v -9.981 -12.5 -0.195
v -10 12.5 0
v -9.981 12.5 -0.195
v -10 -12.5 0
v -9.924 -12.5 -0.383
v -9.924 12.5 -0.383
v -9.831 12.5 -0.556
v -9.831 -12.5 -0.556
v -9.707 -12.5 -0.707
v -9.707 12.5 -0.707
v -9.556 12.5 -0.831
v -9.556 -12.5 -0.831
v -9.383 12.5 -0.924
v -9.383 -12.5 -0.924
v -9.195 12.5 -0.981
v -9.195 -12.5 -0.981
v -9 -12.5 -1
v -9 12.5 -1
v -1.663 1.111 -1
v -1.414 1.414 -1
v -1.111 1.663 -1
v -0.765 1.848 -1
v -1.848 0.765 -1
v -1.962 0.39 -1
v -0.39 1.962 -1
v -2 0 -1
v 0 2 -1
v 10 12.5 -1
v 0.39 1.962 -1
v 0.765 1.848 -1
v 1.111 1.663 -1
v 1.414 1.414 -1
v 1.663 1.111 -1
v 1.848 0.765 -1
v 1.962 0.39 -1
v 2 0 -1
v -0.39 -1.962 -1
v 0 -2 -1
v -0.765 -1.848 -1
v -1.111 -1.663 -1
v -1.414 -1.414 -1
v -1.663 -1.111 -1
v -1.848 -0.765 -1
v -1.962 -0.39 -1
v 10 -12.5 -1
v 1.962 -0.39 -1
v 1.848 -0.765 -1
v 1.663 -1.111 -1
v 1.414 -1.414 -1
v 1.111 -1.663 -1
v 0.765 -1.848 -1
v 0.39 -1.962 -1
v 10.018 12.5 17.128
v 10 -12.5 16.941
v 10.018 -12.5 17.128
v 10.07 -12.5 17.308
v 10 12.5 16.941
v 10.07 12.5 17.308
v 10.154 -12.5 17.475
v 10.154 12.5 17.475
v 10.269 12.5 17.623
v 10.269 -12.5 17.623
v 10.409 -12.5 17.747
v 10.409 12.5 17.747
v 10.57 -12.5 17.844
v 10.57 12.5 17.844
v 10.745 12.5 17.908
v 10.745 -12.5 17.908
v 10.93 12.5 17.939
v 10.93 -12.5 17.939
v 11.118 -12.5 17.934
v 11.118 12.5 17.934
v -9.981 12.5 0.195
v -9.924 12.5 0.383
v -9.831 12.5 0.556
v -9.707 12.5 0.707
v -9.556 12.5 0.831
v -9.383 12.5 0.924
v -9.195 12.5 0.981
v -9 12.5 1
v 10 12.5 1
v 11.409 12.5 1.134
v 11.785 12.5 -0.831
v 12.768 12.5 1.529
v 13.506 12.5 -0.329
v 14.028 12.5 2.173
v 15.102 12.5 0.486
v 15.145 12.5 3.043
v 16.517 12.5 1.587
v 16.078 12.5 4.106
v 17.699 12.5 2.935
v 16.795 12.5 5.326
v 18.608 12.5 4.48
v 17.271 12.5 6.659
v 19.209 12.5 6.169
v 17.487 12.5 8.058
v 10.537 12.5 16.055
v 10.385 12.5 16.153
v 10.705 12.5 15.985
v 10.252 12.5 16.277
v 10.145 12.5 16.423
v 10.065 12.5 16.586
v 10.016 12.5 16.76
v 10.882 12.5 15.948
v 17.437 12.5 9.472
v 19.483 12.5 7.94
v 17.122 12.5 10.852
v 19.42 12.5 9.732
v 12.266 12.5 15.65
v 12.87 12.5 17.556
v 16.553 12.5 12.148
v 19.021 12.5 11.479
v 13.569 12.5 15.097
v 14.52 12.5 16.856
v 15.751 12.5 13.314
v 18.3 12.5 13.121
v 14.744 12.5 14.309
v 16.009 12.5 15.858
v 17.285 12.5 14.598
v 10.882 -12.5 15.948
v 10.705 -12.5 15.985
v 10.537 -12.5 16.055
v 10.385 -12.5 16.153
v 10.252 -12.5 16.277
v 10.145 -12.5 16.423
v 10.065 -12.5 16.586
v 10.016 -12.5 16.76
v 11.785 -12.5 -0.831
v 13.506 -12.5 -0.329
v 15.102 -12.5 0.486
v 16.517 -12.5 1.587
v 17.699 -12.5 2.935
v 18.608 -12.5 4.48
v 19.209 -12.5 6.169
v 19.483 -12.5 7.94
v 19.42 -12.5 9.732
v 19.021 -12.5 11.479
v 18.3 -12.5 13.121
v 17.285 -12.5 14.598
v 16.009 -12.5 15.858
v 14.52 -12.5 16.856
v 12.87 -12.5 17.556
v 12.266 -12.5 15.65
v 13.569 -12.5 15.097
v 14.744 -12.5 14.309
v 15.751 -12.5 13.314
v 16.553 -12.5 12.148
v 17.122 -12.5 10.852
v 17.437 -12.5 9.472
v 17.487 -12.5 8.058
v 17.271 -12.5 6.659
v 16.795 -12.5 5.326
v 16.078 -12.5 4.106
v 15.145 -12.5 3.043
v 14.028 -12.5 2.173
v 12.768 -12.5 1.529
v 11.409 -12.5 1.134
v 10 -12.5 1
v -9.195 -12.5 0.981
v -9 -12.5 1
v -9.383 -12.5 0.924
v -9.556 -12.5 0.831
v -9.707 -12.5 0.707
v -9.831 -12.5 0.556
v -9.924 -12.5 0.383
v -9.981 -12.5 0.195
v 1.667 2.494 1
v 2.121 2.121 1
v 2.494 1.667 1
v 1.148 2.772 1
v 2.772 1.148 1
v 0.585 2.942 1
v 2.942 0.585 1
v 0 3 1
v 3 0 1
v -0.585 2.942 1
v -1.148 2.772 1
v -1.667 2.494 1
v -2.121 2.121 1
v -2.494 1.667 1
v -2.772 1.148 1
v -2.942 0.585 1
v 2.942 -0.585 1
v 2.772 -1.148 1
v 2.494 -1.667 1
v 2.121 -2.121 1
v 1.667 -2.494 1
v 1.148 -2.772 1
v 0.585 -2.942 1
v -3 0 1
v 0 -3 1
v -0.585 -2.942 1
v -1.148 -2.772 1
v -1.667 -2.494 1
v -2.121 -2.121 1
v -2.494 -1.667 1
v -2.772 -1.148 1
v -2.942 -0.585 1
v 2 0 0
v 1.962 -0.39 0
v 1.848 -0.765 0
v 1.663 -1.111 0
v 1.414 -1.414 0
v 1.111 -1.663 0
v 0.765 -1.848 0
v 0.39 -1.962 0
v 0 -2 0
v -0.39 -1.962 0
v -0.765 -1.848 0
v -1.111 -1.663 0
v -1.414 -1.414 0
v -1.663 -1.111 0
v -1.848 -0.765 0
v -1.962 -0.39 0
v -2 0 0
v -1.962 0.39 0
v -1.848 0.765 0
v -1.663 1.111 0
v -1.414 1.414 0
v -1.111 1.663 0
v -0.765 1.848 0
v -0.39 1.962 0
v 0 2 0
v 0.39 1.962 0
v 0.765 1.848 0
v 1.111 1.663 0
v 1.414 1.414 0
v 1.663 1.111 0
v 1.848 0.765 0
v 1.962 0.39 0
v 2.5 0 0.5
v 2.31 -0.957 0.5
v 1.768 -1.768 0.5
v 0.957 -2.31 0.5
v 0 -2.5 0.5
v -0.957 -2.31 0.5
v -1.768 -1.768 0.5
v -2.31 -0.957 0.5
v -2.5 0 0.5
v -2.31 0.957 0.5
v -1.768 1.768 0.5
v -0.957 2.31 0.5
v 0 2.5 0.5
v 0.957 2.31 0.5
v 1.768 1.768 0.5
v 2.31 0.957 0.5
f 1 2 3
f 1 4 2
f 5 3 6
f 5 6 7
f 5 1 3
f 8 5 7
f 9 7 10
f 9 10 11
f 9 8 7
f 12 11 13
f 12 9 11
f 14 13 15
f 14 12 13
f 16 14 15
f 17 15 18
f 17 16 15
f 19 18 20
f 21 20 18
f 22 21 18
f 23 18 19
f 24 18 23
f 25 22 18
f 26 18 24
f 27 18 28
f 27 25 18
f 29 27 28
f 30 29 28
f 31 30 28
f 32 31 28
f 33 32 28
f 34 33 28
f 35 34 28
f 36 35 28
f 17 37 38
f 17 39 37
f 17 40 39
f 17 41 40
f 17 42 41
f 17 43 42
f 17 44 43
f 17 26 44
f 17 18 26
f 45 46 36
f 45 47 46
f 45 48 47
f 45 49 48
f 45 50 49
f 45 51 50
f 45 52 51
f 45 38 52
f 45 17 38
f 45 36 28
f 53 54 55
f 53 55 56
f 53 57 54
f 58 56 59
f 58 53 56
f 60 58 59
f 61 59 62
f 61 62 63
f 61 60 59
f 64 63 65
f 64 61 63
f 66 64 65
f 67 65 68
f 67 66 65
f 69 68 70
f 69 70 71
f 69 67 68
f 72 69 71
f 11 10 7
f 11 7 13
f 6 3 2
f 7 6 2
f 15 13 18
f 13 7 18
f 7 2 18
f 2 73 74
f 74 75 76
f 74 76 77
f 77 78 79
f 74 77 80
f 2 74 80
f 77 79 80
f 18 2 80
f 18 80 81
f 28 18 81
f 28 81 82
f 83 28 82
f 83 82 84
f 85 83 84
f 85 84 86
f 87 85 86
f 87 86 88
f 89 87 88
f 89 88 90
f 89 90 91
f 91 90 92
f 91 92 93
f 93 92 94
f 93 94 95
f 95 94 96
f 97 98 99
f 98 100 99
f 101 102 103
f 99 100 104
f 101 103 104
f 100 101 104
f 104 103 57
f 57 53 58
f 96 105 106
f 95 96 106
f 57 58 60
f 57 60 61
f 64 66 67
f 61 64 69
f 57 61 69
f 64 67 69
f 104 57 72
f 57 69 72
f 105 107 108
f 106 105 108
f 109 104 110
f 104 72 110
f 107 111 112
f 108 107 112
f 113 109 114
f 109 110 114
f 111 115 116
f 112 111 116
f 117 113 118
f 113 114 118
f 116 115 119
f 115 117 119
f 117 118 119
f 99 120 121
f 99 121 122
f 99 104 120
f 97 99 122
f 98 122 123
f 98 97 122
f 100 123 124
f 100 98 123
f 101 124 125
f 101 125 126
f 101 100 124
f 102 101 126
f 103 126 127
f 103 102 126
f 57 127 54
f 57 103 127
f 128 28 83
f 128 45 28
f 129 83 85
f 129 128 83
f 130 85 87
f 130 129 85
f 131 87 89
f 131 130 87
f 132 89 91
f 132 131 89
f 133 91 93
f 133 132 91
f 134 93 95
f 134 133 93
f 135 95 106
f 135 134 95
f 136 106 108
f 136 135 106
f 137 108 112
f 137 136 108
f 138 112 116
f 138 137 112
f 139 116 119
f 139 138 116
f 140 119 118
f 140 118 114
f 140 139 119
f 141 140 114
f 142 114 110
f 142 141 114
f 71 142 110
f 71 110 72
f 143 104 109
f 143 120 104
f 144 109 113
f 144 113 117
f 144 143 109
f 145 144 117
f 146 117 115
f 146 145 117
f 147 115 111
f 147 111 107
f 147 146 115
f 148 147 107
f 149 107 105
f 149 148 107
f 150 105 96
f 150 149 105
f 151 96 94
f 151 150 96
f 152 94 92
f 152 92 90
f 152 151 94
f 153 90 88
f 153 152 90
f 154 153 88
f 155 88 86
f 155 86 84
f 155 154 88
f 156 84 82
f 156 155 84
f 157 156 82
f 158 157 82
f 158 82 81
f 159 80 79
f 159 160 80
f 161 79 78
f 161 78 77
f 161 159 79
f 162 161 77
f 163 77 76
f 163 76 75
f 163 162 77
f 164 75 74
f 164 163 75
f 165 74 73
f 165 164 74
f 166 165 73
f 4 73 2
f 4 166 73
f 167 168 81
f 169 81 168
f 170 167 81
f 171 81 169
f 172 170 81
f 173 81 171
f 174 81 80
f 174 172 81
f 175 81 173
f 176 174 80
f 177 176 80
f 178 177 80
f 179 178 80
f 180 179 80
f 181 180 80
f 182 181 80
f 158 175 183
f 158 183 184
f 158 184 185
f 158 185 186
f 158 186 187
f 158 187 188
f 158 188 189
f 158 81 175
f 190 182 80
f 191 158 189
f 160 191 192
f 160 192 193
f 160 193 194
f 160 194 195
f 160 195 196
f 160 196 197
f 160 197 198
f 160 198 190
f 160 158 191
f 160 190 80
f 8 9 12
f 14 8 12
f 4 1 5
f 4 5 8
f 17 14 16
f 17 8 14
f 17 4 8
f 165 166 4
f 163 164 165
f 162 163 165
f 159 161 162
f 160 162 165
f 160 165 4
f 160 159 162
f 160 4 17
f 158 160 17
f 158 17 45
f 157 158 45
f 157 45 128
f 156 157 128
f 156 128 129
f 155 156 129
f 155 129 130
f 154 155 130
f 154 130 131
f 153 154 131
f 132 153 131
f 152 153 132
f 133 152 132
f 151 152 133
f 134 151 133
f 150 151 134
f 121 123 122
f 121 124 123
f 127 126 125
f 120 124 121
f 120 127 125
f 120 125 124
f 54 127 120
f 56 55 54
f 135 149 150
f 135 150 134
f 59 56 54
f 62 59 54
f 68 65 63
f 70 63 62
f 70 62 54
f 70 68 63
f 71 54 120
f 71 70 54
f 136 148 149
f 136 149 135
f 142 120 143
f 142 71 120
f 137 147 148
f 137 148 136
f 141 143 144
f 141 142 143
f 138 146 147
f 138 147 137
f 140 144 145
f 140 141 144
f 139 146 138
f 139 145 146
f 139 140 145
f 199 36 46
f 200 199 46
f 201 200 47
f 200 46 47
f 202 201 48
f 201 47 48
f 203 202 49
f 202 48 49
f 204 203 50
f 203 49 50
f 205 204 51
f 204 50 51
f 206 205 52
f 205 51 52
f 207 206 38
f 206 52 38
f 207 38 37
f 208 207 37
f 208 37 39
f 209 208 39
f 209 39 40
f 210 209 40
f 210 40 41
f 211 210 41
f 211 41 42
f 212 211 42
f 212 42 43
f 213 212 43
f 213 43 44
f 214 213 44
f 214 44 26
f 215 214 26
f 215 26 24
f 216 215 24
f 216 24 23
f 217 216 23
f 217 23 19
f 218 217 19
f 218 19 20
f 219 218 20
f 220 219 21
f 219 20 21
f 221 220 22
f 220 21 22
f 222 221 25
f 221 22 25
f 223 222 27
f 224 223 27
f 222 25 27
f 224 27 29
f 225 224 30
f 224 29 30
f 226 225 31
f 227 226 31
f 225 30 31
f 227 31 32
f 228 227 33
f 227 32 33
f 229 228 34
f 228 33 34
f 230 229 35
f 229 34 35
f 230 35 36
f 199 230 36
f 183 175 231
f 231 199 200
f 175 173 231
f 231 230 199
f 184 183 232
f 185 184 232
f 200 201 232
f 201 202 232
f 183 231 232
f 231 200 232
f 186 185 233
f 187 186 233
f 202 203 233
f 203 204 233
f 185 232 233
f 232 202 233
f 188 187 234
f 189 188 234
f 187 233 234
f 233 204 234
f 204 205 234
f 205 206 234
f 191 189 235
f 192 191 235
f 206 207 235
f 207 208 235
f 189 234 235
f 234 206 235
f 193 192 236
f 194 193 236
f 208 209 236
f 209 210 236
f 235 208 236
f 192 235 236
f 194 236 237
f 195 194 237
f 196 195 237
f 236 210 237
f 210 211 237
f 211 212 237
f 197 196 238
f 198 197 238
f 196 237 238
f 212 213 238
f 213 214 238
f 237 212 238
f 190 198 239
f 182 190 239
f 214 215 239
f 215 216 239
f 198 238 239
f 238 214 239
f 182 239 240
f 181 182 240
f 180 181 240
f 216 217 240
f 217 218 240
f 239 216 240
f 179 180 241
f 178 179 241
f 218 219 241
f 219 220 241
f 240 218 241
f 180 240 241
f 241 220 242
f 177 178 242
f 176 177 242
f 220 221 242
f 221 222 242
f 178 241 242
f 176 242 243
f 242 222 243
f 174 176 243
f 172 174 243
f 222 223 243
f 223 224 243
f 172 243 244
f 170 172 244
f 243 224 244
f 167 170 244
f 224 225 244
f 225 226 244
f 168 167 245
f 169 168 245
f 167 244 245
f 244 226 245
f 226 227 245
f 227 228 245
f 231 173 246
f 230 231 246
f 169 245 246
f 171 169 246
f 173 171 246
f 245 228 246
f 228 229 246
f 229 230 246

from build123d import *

# Parameters (mm, degrees)
F1_DEPTH = 12.5
F2_R     = 2
F3_DEPTH = 25
F4_SIZE  = 1
F5_R     = 0.99999


# Not quite as in the source:
# - a fillet or chamfer is up to 0.001 mm smaller than in the source, because OpenCascade refuses the exact size


with BuildPart() as f1:
    # F0 (on Front) → F1 (new body, symmetric)
    with BuildSketch(Plane.XZ):
        with BuildLine():
            ThreePointArc((10, 16), (17.5, 8.5), (10, 1))
            Line((10, 1), (-10, 1))
            Line((-10, 1), (-10, -1))
            Line((-10, -1), (10, -1))
            ThreePointArc((10, -1), (19.5, 8.5), (10, 18))
            Line((10, 18), (10, 16))
        make_face()
    extrude(amount=F1_DEPTH, both=True)

    # F2 (on face) → F3 (cut)
    with BuildSketch(Plane(origin=(0, 0, -1), x_dir=(1, 0, 0), z_dir=(0, 0, -1))):
        Circle(F2_R)
    extrude(amount=-F3_DEPTH, mode=Mode.SUBTRACT)

    # F4
    f4_edges = [f1.edges().sort_by_distance(p)[0] for p in [
        (-2, 0, 1),
    ]]
    chamfer(f4_edges, length=F4_SIZE)

    # F5 (radius 1 in the source; OpenCascade refuses exactly that, so slightly less here)
    f5_edges = [f1.edges().sort_by_distance(p)[0] for p in [
        (10, 0, 18),
        (10, 0, 16),
        (-10, 0, 1),
        (-10, 0, -1),
    ]]
    fillet(f5_edges, radius=F5_R)


solid = f1.part
